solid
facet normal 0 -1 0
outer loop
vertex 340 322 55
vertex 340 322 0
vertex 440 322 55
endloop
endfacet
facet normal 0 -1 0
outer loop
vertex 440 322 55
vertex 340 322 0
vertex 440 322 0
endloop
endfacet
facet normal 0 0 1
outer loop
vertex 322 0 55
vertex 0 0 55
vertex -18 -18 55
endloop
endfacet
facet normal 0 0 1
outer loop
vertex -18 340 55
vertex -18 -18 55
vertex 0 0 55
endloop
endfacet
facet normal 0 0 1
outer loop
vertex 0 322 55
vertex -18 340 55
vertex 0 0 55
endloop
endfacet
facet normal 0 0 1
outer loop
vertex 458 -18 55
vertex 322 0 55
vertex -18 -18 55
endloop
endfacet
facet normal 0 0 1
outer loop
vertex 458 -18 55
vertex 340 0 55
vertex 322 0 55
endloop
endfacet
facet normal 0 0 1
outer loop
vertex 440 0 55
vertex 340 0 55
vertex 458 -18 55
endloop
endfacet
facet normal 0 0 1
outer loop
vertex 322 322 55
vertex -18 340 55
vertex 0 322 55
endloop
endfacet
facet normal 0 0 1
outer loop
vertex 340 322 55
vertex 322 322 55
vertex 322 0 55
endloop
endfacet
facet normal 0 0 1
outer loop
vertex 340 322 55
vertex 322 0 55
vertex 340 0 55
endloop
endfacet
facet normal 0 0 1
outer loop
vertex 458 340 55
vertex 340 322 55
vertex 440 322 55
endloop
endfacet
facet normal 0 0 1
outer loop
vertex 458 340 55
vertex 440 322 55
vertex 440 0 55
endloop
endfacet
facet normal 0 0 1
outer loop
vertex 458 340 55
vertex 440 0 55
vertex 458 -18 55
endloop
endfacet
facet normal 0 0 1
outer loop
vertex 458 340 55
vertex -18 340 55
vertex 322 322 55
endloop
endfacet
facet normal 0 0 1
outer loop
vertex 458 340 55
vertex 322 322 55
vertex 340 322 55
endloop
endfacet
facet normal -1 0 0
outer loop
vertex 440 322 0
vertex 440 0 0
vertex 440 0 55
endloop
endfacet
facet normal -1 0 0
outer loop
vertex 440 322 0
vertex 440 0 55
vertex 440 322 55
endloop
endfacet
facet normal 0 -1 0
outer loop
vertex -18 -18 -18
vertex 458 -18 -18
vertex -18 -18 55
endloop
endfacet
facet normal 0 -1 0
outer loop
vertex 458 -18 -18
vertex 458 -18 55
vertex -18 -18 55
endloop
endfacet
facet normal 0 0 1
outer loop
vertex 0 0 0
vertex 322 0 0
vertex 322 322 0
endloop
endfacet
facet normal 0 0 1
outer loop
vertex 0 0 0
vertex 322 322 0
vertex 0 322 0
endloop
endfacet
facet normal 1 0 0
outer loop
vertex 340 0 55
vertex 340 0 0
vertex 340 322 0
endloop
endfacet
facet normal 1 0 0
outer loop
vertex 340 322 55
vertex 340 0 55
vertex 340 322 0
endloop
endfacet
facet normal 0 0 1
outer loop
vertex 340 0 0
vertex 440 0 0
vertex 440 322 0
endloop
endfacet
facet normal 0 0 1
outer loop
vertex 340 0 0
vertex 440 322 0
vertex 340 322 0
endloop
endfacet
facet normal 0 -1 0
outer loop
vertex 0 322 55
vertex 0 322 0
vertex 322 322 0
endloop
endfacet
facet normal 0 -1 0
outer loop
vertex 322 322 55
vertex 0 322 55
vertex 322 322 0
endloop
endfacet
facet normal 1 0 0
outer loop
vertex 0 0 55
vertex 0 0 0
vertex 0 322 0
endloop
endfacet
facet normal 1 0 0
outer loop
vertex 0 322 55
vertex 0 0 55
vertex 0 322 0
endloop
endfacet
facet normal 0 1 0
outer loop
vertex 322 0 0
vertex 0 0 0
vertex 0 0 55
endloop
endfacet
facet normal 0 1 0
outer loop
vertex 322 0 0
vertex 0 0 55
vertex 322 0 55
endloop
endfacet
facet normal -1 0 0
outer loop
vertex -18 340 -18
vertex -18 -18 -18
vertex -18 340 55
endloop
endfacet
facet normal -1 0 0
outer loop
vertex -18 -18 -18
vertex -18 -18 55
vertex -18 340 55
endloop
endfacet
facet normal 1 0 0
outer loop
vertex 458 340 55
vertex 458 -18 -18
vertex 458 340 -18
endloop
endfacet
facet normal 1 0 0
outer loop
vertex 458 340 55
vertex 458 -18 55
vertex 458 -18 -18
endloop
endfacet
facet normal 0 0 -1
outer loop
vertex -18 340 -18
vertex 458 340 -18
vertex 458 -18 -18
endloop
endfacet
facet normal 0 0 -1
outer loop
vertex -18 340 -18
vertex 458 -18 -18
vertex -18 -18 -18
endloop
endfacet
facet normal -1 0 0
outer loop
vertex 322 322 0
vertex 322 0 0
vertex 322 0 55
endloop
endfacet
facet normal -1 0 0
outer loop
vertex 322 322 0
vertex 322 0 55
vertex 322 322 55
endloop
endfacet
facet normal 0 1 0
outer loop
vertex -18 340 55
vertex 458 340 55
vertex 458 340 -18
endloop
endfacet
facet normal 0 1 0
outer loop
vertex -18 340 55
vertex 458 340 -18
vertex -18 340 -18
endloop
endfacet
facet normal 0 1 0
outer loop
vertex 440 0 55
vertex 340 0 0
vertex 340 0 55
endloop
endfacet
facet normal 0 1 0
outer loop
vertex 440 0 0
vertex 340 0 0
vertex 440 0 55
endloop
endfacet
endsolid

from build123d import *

# Parameters (mm, degrees)
SKETCH1_W           = 322
SKETCH1_H           = 322
SKETCH1_W_2         = 100
BOSS_EXTRUDE1_DEPTH = 55
SKETCH2_W           = 476
SKETCH2_H           = 358
BOSS_EXTRUDE2_DEPTH = 18


with BuildPart() as part:
    # Sketch1 → Boss-Extrude1 (new body)
    with BuildSketch(Plane.XY):
        Polygon((-18, -18), (340, -18), (458, -18), (458, 340), (340, 340), (-18, 340), align=None)
        with Locations((161, 161)):
            Rectangle(SKETCH1_W, SKETCH1_H, mode=Mode.SUBTRACT)
        with Locations((390, 161)):
            Rectangle(SKETCH1_W_2, SKETCH1_H, mode=Mode.SUBTRACT)
    extrude(amount=BOSS_EXTRUDE1_DEPTH)

    # Sketch2 → Boss-Extrude2 (add)
    with BuildSketch(Plane(origin=(0, 0, 0), x_dir=(-1, 0, 0), z_dir=(0, 0, -1))):
        with Locations((-220, 161)):
            Rectangle(SKETCH2_W, SKETCH2_H)
    extrude(amount=BOSS_EXTRUDE2_DEPTH)


solid = part.part
